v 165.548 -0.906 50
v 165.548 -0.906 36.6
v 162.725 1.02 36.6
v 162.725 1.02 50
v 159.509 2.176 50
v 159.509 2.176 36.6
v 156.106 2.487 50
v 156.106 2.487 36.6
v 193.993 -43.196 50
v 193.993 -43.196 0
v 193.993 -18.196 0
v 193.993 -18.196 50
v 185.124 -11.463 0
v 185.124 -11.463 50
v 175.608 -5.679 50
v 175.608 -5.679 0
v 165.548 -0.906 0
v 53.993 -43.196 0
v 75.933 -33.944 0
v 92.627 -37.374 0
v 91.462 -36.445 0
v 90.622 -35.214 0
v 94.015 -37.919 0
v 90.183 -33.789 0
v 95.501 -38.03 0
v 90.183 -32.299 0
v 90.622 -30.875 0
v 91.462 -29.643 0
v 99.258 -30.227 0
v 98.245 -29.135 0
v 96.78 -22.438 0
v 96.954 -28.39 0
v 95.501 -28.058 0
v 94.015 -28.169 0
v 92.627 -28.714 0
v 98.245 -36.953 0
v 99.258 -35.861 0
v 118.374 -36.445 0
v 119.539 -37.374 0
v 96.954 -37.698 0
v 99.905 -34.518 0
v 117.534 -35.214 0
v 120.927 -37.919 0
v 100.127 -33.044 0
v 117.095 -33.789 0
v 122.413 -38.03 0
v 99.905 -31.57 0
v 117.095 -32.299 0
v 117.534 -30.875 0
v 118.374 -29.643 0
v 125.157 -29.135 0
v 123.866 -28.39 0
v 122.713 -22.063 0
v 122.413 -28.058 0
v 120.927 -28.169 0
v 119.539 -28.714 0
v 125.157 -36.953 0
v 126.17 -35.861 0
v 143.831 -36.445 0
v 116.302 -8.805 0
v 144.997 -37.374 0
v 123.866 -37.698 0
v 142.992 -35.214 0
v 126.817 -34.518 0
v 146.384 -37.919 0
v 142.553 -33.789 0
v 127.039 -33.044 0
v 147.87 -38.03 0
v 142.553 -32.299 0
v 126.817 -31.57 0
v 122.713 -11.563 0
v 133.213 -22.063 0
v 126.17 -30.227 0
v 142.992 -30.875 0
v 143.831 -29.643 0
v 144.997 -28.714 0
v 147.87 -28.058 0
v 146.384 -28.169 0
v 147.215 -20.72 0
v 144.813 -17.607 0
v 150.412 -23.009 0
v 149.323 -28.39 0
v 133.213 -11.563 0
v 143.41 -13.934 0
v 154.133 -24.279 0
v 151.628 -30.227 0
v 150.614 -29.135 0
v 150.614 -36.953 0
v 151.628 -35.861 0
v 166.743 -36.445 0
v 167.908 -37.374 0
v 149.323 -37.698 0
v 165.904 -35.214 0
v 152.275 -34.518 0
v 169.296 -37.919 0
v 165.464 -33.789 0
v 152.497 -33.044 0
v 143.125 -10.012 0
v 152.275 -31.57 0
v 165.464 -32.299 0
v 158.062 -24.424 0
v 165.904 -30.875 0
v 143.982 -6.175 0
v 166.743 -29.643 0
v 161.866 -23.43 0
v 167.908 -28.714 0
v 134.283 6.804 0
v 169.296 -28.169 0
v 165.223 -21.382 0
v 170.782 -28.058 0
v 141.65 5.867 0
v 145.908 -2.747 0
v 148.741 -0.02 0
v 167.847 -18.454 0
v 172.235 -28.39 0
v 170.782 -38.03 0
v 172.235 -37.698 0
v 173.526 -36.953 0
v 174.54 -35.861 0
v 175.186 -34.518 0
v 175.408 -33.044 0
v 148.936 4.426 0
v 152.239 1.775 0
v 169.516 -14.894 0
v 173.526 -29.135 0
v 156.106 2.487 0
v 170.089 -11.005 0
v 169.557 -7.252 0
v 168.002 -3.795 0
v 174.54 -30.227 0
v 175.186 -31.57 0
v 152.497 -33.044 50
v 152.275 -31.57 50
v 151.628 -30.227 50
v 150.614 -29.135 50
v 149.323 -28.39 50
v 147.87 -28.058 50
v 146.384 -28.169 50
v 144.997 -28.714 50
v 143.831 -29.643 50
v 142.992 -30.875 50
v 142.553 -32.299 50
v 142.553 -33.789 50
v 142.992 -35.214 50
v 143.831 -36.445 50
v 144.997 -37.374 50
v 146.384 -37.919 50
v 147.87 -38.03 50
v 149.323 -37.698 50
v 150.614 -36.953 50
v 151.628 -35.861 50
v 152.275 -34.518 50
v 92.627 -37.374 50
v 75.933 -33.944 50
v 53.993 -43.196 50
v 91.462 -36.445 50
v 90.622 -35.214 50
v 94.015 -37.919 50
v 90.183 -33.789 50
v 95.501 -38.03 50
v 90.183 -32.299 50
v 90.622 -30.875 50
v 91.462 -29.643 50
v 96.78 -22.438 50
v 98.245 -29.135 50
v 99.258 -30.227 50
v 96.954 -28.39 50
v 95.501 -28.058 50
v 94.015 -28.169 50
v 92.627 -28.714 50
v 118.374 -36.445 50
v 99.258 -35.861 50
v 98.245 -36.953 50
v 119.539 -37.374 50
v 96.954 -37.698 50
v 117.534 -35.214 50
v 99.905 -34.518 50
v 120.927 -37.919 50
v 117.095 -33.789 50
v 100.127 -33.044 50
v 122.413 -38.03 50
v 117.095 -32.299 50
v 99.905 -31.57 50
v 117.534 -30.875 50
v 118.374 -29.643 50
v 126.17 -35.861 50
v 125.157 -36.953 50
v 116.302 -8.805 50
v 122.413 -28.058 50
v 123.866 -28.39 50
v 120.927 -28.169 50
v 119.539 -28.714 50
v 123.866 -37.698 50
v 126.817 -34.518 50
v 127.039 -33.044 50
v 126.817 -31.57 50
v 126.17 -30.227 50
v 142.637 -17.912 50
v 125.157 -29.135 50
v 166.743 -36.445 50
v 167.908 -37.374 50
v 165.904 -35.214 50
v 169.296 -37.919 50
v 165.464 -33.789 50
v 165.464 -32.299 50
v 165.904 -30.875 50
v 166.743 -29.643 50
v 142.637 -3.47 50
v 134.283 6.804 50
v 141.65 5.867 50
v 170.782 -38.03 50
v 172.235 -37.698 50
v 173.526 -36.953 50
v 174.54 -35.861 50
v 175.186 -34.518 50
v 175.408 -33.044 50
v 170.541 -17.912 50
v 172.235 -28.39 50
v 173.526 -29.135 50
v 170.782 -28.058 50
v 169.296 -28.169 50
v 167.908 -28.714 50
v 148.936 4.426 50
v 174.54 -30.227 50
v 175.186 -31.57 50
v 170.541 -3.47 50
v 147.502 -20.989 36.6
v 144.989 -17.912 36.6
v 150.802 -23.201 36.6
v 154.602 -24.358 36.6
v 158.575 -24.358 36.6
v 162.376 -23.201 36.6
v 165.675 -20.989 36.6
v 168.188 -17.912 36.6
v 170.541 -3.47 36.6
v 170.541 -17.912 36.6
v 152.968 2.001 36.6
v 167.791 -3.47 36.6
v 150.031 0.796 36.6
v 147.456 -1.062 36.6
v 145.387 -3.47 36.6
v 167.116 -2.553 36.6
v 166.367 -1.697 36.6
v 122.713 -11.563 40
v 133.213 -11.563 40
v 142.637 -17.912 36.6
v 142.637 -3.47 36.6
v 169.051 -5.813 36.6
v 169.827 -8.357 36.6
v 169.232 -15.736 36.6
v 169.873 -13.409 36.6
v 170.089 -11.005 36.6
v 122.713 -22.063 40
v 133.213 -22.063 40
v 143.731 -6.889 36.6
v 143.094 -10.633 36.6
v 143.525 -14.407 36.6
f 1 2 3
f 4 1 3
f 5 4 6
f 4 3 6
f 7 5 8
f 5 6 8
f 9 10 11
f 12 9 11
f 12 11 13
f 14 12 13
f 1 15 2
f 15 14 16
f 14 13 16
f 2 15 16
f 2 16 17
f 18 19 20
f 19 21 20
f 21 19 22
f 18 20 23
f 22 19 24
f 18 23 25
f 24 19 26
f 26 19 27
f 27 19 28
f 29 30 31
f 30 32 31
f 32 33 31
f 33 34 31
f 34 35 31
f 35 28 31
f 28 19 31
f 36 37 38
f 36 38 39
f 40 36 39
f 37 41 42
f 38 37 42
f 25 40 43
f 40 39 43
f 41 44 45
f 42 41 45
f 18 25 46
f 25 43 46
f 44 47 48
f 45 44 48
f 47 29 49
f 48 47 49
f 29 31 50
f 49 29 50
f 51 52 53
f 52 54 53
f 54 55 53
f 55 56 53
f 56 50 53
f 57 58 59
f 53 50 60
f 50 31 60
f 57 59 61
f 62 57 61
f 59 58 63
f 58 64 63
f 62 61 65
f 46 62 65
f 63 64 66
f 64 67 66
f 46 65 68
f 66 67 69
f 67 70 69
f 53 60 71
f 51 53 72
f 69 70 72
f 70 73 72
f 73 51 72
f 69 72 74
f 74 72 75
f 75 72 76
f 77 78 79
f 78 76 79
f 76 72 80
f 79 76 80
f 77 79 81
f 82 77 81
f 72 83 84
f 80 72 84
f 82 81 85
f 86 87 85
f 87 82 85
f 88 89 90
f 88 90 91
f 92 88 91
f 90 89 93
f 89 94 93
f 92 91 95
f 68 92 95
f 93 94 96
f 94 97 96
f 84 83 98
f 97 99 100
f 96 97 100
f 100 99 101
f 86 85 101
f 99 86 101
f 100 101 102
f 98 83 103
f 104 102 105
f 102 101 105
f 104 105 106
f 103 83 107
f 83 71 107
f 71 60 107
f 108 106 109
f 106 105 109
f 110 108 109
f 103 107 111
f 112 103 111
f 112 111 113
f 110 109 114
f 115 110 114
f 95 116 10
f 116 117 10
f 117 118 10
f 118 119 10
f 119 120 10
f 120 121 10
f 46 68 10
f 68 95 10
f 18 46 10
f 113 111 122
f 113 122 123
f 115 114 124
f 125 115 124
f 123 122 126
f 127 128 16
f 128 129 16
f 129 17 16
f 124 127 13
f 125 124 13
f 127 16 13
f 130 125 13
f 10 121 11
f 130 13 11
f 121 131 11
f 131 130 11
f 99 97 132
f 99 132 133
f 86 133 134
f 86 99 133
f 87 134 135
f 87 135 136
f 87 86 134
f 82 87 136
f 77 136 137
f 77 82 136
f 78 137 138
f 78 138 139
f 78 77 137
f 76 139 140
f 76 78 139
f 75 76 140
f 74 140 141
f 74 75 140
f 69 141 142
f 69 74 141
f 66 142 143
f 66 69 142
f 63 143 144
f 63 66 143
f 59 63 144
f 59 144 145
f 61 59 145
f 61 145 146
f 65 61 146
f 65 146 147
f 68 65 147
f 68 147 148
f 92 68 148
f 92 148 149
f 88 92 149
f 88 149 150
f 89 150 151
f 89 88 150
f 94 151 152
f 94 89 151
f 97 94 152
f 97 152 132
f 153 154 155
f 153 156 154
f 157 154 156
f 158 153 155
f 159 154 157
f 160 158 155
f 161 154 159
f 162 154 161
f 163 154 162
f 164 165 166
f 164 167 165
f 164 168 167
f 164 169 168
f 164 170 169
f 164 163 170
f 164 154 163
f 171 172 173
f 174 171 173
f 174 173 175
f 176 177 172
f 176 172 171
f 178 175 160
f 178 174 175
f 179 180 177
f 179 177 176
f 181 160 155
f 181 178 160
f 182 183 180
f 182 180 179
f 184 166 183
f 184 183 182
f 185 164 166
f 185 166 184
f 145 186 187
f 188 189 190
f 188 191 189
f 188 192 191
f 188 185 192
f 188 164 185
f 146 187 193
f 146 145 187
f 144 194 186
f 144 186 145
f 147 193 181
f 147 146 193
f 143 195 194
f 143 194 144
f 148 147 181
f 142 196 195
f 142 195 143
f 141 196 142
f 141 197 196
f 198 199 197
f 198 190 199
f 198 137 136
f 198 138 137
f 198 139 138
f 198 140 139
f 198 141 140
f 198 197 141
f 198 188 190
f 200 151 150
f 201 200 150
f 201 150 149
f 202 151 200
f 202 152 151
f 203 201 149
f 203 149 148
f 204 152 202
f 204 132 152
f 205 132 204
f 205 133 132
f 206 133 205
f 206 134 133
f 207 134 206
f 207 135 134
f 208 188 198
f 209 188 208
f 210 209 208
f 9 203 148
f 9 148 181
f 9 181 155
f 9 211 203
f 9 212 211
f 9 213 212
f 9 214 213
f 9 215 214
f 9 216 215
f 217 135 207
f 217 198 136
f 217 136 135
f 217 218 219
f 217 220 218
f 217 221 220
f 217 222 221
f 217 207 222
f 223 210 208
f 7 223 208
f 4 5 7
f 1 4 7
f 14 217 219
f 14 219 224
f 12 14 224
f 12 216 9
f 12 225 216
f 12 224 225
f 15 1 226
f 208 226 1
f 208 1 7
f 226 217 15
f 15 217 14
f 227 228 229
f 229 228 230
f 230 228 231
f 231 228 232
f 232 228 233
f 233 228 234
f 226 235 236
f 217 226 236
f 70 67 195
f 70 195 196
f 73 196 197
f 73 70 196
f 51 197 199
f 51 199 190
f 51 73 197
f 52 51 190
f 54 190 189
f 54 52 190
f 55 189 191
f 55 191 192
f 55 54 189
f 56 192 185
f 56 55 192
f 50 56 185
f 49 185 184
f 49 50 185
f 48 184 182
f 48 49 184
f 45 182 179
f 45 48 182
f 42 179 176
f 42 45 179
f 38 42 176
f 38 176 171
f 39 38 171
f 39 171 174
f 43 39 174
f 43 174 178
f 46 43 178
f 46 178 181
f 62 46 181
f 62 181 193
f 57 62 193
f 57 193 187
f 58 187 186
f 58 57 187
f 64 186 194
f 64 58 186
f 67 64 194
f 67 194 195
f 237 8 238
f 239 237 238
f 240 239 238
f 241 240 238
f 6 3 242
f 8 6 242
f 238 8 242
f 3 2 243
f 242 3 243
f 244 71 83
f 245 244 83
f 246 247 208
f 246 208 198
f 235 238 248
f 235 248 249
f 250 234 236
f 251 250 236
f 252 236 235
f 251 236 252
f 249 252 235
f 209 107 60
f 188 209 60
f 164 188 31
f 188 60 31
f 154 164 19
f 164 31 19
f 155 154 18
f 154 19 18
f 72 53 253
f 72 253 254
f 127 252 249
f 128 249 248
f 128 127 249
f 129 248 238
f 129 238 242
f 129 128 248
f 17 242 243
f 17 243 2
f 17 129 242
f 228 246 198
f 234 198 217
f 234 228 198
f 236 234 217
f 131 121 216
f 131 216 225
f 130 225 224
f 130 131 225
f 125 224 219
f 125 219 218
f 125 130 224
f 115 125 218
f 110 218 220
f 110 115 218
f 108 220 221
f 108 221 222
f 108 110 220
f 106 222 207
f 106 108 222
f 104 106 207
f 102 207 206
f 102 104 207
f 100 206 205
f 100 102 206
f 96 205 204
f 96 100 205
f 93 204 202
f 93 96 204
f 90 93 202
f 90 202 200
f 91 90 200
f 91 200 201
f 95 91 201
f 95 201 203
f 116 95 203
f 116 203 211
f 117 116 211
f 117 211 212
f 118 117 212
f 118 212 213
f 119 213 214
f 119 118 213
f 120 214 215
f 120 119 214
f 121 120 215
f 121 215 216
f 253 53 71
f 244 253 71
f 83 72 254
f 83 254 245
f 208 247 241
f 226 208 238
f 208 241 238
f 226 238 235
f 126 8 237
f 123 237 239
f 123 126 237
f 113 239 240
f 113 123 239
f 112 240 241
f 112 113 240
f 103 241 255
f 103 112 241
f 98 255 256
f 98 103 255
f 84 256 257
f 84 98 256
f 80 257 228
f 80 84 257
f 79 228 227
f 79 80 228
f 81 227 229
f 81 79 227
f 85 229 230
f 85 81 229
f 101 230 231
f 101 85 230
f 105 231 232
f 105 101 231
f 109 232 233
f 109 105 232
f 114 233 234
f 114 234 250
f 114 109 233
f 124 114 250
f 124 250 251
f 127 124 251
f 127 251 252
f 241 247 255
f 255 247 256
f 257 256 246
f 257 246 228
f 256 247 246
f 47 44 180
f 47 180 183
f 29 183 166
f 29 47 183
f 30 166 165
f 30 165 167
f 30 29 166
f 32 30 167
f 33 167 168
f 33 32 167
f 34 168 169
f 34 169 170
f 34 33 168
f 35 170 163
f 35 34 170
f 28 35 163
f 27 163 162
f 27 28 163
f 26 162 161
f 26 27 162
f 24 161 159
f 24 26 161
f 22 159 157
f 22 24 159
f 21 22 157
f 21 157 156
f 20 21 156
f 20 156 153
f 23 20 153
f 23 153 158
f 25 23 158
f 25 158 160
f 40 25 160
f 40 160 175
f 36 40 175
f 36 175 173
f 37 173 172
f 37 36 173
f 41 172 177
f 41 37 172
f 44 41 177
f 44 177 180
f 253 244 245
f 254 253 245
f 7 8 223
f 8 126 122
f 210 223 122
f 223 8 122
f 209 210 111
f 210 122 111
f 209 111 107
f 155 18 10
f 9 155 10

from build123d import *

# Parameters (mm, degrees)
F0_R     = 5
F1_DEPTH = 50
F2_DEPTH = 36.6
F3_R     = 4.8
F4_DEPTH = 2.7
F5_W     = 10.5
F5_H     = 10.5
F6_DEPTH = 40
F7_W     = 27.904123
F7_H     = 14.441377
F8_DEPTH = 25


with BuildPart() as f1:
    # F0 (on Top) → F1 (new body)
    with BuildSketch(Plane.XY):
        with BuildLine():
            ThreePointArc((134.282529, 6.80419), (96.779809, -22.438314), (53.993077, -43.19581))
            Line((53.993077, -43.19581), (193.993077, -43.19581))
            Line((193.993077, -43.19581), (193.993077, -18.19581))
            ThreePointArc((193.993077, -18.19581), (180.440706, -8.448382), (165.548028, -0.906017))
            ThreePointArc((165.548028, -0.906017), (168.901273, -5.468336), (170.088644, -11.004504))
            ThreePointArc((170.088644, -11.004504), (147.215011, -20.719698), (156.105681, 2.486854))
            ThreePointArc((156.105681, 2.486854), (145.305567, 5.208938), (134.282529, 6.80419))
        make_face()
        with Locations((95.127106, -33.044094)):
            Circle(F0_R, mode=Mode.SUBTRACT)
        with Locations((122.039258, -33.044094)):
            Circle(F0_R, mode=Mode.SUBTRACT)
        with Locations((147.4967, -33.044094)):
            Circle(F0_R, mode=Mode.SUBTRACT)
        with Locations((170.408398, -33.044094)):
            Circle(F0_R, mode=Mode.SUBTRACT)
        with BuildLine():
            ThreePointArc((165.548028, -0.906017), (161.153764, 1.700207), (156.105681, 2.486854))
            ThreePointArc((156.105681, 2.486854), (147.215011, -20.719698), (170.088644, -11.004504))
            ThreePointArc((170.088644, -11.004504), (168.901273, -5.468336), (165.548028, -0.906017))
        make_face()
    extrude(amount=F1_DEPTH)

    # F0 (on Top) → F2 (cut)
    with BuildSketch(Plane.XY):
        with BuildLine():
            ThreePointArc((165.548028, -0.906017), (161.153764, 1.700207), (156.105681, 2.486854))
            ThreePointArc((156.105681, 2.486854), (147.215011, -20.719698), (170.088644, -11.004504))
            ThreePointArc((170.088644, -11.004504), (168.901273, -5.468336), (165.548028, -0.906017))
        make_face()
    extrude(amount=F2_DEPTH, mode=Mode.SUBTRACT)

    # F3 (on face) → F4 (cut)
    with BuildSketch(Plane(origin=(0, 0, 36.6), x_dir=(1, 0, 0), z_dir=(0, 0, -1))):
        with Locations((156.588644, 11.004504)):
            Circle(F3_R)
    extrude(amount=-F4_DEPTH, mode=Mode.SUBTRACT)

    # F5 (on face) → F6 (cut)
    with BuildSketch(Plane.XY):
        with Locations((127.963409, -16.812982)):
            Rectangle(F5_W, F5_H)
    extrude(amount=F6_DEPTH, mode=Mode.SUBTRACT)

    # F7 (on face) → F8 (cut)
    with BuildSketch(Plane(origin=(0, 0, 36.6), x_dir=(1, 0, 0), z_dir=(0, 0, -1))):
        with Locations((156.589418, 10.691026)):
            Rectangle(F7_W, F7_H)
    extrude(amount=-F8_DEPTH, mode=Mode.SUBTRACT)


solid = f1.part
